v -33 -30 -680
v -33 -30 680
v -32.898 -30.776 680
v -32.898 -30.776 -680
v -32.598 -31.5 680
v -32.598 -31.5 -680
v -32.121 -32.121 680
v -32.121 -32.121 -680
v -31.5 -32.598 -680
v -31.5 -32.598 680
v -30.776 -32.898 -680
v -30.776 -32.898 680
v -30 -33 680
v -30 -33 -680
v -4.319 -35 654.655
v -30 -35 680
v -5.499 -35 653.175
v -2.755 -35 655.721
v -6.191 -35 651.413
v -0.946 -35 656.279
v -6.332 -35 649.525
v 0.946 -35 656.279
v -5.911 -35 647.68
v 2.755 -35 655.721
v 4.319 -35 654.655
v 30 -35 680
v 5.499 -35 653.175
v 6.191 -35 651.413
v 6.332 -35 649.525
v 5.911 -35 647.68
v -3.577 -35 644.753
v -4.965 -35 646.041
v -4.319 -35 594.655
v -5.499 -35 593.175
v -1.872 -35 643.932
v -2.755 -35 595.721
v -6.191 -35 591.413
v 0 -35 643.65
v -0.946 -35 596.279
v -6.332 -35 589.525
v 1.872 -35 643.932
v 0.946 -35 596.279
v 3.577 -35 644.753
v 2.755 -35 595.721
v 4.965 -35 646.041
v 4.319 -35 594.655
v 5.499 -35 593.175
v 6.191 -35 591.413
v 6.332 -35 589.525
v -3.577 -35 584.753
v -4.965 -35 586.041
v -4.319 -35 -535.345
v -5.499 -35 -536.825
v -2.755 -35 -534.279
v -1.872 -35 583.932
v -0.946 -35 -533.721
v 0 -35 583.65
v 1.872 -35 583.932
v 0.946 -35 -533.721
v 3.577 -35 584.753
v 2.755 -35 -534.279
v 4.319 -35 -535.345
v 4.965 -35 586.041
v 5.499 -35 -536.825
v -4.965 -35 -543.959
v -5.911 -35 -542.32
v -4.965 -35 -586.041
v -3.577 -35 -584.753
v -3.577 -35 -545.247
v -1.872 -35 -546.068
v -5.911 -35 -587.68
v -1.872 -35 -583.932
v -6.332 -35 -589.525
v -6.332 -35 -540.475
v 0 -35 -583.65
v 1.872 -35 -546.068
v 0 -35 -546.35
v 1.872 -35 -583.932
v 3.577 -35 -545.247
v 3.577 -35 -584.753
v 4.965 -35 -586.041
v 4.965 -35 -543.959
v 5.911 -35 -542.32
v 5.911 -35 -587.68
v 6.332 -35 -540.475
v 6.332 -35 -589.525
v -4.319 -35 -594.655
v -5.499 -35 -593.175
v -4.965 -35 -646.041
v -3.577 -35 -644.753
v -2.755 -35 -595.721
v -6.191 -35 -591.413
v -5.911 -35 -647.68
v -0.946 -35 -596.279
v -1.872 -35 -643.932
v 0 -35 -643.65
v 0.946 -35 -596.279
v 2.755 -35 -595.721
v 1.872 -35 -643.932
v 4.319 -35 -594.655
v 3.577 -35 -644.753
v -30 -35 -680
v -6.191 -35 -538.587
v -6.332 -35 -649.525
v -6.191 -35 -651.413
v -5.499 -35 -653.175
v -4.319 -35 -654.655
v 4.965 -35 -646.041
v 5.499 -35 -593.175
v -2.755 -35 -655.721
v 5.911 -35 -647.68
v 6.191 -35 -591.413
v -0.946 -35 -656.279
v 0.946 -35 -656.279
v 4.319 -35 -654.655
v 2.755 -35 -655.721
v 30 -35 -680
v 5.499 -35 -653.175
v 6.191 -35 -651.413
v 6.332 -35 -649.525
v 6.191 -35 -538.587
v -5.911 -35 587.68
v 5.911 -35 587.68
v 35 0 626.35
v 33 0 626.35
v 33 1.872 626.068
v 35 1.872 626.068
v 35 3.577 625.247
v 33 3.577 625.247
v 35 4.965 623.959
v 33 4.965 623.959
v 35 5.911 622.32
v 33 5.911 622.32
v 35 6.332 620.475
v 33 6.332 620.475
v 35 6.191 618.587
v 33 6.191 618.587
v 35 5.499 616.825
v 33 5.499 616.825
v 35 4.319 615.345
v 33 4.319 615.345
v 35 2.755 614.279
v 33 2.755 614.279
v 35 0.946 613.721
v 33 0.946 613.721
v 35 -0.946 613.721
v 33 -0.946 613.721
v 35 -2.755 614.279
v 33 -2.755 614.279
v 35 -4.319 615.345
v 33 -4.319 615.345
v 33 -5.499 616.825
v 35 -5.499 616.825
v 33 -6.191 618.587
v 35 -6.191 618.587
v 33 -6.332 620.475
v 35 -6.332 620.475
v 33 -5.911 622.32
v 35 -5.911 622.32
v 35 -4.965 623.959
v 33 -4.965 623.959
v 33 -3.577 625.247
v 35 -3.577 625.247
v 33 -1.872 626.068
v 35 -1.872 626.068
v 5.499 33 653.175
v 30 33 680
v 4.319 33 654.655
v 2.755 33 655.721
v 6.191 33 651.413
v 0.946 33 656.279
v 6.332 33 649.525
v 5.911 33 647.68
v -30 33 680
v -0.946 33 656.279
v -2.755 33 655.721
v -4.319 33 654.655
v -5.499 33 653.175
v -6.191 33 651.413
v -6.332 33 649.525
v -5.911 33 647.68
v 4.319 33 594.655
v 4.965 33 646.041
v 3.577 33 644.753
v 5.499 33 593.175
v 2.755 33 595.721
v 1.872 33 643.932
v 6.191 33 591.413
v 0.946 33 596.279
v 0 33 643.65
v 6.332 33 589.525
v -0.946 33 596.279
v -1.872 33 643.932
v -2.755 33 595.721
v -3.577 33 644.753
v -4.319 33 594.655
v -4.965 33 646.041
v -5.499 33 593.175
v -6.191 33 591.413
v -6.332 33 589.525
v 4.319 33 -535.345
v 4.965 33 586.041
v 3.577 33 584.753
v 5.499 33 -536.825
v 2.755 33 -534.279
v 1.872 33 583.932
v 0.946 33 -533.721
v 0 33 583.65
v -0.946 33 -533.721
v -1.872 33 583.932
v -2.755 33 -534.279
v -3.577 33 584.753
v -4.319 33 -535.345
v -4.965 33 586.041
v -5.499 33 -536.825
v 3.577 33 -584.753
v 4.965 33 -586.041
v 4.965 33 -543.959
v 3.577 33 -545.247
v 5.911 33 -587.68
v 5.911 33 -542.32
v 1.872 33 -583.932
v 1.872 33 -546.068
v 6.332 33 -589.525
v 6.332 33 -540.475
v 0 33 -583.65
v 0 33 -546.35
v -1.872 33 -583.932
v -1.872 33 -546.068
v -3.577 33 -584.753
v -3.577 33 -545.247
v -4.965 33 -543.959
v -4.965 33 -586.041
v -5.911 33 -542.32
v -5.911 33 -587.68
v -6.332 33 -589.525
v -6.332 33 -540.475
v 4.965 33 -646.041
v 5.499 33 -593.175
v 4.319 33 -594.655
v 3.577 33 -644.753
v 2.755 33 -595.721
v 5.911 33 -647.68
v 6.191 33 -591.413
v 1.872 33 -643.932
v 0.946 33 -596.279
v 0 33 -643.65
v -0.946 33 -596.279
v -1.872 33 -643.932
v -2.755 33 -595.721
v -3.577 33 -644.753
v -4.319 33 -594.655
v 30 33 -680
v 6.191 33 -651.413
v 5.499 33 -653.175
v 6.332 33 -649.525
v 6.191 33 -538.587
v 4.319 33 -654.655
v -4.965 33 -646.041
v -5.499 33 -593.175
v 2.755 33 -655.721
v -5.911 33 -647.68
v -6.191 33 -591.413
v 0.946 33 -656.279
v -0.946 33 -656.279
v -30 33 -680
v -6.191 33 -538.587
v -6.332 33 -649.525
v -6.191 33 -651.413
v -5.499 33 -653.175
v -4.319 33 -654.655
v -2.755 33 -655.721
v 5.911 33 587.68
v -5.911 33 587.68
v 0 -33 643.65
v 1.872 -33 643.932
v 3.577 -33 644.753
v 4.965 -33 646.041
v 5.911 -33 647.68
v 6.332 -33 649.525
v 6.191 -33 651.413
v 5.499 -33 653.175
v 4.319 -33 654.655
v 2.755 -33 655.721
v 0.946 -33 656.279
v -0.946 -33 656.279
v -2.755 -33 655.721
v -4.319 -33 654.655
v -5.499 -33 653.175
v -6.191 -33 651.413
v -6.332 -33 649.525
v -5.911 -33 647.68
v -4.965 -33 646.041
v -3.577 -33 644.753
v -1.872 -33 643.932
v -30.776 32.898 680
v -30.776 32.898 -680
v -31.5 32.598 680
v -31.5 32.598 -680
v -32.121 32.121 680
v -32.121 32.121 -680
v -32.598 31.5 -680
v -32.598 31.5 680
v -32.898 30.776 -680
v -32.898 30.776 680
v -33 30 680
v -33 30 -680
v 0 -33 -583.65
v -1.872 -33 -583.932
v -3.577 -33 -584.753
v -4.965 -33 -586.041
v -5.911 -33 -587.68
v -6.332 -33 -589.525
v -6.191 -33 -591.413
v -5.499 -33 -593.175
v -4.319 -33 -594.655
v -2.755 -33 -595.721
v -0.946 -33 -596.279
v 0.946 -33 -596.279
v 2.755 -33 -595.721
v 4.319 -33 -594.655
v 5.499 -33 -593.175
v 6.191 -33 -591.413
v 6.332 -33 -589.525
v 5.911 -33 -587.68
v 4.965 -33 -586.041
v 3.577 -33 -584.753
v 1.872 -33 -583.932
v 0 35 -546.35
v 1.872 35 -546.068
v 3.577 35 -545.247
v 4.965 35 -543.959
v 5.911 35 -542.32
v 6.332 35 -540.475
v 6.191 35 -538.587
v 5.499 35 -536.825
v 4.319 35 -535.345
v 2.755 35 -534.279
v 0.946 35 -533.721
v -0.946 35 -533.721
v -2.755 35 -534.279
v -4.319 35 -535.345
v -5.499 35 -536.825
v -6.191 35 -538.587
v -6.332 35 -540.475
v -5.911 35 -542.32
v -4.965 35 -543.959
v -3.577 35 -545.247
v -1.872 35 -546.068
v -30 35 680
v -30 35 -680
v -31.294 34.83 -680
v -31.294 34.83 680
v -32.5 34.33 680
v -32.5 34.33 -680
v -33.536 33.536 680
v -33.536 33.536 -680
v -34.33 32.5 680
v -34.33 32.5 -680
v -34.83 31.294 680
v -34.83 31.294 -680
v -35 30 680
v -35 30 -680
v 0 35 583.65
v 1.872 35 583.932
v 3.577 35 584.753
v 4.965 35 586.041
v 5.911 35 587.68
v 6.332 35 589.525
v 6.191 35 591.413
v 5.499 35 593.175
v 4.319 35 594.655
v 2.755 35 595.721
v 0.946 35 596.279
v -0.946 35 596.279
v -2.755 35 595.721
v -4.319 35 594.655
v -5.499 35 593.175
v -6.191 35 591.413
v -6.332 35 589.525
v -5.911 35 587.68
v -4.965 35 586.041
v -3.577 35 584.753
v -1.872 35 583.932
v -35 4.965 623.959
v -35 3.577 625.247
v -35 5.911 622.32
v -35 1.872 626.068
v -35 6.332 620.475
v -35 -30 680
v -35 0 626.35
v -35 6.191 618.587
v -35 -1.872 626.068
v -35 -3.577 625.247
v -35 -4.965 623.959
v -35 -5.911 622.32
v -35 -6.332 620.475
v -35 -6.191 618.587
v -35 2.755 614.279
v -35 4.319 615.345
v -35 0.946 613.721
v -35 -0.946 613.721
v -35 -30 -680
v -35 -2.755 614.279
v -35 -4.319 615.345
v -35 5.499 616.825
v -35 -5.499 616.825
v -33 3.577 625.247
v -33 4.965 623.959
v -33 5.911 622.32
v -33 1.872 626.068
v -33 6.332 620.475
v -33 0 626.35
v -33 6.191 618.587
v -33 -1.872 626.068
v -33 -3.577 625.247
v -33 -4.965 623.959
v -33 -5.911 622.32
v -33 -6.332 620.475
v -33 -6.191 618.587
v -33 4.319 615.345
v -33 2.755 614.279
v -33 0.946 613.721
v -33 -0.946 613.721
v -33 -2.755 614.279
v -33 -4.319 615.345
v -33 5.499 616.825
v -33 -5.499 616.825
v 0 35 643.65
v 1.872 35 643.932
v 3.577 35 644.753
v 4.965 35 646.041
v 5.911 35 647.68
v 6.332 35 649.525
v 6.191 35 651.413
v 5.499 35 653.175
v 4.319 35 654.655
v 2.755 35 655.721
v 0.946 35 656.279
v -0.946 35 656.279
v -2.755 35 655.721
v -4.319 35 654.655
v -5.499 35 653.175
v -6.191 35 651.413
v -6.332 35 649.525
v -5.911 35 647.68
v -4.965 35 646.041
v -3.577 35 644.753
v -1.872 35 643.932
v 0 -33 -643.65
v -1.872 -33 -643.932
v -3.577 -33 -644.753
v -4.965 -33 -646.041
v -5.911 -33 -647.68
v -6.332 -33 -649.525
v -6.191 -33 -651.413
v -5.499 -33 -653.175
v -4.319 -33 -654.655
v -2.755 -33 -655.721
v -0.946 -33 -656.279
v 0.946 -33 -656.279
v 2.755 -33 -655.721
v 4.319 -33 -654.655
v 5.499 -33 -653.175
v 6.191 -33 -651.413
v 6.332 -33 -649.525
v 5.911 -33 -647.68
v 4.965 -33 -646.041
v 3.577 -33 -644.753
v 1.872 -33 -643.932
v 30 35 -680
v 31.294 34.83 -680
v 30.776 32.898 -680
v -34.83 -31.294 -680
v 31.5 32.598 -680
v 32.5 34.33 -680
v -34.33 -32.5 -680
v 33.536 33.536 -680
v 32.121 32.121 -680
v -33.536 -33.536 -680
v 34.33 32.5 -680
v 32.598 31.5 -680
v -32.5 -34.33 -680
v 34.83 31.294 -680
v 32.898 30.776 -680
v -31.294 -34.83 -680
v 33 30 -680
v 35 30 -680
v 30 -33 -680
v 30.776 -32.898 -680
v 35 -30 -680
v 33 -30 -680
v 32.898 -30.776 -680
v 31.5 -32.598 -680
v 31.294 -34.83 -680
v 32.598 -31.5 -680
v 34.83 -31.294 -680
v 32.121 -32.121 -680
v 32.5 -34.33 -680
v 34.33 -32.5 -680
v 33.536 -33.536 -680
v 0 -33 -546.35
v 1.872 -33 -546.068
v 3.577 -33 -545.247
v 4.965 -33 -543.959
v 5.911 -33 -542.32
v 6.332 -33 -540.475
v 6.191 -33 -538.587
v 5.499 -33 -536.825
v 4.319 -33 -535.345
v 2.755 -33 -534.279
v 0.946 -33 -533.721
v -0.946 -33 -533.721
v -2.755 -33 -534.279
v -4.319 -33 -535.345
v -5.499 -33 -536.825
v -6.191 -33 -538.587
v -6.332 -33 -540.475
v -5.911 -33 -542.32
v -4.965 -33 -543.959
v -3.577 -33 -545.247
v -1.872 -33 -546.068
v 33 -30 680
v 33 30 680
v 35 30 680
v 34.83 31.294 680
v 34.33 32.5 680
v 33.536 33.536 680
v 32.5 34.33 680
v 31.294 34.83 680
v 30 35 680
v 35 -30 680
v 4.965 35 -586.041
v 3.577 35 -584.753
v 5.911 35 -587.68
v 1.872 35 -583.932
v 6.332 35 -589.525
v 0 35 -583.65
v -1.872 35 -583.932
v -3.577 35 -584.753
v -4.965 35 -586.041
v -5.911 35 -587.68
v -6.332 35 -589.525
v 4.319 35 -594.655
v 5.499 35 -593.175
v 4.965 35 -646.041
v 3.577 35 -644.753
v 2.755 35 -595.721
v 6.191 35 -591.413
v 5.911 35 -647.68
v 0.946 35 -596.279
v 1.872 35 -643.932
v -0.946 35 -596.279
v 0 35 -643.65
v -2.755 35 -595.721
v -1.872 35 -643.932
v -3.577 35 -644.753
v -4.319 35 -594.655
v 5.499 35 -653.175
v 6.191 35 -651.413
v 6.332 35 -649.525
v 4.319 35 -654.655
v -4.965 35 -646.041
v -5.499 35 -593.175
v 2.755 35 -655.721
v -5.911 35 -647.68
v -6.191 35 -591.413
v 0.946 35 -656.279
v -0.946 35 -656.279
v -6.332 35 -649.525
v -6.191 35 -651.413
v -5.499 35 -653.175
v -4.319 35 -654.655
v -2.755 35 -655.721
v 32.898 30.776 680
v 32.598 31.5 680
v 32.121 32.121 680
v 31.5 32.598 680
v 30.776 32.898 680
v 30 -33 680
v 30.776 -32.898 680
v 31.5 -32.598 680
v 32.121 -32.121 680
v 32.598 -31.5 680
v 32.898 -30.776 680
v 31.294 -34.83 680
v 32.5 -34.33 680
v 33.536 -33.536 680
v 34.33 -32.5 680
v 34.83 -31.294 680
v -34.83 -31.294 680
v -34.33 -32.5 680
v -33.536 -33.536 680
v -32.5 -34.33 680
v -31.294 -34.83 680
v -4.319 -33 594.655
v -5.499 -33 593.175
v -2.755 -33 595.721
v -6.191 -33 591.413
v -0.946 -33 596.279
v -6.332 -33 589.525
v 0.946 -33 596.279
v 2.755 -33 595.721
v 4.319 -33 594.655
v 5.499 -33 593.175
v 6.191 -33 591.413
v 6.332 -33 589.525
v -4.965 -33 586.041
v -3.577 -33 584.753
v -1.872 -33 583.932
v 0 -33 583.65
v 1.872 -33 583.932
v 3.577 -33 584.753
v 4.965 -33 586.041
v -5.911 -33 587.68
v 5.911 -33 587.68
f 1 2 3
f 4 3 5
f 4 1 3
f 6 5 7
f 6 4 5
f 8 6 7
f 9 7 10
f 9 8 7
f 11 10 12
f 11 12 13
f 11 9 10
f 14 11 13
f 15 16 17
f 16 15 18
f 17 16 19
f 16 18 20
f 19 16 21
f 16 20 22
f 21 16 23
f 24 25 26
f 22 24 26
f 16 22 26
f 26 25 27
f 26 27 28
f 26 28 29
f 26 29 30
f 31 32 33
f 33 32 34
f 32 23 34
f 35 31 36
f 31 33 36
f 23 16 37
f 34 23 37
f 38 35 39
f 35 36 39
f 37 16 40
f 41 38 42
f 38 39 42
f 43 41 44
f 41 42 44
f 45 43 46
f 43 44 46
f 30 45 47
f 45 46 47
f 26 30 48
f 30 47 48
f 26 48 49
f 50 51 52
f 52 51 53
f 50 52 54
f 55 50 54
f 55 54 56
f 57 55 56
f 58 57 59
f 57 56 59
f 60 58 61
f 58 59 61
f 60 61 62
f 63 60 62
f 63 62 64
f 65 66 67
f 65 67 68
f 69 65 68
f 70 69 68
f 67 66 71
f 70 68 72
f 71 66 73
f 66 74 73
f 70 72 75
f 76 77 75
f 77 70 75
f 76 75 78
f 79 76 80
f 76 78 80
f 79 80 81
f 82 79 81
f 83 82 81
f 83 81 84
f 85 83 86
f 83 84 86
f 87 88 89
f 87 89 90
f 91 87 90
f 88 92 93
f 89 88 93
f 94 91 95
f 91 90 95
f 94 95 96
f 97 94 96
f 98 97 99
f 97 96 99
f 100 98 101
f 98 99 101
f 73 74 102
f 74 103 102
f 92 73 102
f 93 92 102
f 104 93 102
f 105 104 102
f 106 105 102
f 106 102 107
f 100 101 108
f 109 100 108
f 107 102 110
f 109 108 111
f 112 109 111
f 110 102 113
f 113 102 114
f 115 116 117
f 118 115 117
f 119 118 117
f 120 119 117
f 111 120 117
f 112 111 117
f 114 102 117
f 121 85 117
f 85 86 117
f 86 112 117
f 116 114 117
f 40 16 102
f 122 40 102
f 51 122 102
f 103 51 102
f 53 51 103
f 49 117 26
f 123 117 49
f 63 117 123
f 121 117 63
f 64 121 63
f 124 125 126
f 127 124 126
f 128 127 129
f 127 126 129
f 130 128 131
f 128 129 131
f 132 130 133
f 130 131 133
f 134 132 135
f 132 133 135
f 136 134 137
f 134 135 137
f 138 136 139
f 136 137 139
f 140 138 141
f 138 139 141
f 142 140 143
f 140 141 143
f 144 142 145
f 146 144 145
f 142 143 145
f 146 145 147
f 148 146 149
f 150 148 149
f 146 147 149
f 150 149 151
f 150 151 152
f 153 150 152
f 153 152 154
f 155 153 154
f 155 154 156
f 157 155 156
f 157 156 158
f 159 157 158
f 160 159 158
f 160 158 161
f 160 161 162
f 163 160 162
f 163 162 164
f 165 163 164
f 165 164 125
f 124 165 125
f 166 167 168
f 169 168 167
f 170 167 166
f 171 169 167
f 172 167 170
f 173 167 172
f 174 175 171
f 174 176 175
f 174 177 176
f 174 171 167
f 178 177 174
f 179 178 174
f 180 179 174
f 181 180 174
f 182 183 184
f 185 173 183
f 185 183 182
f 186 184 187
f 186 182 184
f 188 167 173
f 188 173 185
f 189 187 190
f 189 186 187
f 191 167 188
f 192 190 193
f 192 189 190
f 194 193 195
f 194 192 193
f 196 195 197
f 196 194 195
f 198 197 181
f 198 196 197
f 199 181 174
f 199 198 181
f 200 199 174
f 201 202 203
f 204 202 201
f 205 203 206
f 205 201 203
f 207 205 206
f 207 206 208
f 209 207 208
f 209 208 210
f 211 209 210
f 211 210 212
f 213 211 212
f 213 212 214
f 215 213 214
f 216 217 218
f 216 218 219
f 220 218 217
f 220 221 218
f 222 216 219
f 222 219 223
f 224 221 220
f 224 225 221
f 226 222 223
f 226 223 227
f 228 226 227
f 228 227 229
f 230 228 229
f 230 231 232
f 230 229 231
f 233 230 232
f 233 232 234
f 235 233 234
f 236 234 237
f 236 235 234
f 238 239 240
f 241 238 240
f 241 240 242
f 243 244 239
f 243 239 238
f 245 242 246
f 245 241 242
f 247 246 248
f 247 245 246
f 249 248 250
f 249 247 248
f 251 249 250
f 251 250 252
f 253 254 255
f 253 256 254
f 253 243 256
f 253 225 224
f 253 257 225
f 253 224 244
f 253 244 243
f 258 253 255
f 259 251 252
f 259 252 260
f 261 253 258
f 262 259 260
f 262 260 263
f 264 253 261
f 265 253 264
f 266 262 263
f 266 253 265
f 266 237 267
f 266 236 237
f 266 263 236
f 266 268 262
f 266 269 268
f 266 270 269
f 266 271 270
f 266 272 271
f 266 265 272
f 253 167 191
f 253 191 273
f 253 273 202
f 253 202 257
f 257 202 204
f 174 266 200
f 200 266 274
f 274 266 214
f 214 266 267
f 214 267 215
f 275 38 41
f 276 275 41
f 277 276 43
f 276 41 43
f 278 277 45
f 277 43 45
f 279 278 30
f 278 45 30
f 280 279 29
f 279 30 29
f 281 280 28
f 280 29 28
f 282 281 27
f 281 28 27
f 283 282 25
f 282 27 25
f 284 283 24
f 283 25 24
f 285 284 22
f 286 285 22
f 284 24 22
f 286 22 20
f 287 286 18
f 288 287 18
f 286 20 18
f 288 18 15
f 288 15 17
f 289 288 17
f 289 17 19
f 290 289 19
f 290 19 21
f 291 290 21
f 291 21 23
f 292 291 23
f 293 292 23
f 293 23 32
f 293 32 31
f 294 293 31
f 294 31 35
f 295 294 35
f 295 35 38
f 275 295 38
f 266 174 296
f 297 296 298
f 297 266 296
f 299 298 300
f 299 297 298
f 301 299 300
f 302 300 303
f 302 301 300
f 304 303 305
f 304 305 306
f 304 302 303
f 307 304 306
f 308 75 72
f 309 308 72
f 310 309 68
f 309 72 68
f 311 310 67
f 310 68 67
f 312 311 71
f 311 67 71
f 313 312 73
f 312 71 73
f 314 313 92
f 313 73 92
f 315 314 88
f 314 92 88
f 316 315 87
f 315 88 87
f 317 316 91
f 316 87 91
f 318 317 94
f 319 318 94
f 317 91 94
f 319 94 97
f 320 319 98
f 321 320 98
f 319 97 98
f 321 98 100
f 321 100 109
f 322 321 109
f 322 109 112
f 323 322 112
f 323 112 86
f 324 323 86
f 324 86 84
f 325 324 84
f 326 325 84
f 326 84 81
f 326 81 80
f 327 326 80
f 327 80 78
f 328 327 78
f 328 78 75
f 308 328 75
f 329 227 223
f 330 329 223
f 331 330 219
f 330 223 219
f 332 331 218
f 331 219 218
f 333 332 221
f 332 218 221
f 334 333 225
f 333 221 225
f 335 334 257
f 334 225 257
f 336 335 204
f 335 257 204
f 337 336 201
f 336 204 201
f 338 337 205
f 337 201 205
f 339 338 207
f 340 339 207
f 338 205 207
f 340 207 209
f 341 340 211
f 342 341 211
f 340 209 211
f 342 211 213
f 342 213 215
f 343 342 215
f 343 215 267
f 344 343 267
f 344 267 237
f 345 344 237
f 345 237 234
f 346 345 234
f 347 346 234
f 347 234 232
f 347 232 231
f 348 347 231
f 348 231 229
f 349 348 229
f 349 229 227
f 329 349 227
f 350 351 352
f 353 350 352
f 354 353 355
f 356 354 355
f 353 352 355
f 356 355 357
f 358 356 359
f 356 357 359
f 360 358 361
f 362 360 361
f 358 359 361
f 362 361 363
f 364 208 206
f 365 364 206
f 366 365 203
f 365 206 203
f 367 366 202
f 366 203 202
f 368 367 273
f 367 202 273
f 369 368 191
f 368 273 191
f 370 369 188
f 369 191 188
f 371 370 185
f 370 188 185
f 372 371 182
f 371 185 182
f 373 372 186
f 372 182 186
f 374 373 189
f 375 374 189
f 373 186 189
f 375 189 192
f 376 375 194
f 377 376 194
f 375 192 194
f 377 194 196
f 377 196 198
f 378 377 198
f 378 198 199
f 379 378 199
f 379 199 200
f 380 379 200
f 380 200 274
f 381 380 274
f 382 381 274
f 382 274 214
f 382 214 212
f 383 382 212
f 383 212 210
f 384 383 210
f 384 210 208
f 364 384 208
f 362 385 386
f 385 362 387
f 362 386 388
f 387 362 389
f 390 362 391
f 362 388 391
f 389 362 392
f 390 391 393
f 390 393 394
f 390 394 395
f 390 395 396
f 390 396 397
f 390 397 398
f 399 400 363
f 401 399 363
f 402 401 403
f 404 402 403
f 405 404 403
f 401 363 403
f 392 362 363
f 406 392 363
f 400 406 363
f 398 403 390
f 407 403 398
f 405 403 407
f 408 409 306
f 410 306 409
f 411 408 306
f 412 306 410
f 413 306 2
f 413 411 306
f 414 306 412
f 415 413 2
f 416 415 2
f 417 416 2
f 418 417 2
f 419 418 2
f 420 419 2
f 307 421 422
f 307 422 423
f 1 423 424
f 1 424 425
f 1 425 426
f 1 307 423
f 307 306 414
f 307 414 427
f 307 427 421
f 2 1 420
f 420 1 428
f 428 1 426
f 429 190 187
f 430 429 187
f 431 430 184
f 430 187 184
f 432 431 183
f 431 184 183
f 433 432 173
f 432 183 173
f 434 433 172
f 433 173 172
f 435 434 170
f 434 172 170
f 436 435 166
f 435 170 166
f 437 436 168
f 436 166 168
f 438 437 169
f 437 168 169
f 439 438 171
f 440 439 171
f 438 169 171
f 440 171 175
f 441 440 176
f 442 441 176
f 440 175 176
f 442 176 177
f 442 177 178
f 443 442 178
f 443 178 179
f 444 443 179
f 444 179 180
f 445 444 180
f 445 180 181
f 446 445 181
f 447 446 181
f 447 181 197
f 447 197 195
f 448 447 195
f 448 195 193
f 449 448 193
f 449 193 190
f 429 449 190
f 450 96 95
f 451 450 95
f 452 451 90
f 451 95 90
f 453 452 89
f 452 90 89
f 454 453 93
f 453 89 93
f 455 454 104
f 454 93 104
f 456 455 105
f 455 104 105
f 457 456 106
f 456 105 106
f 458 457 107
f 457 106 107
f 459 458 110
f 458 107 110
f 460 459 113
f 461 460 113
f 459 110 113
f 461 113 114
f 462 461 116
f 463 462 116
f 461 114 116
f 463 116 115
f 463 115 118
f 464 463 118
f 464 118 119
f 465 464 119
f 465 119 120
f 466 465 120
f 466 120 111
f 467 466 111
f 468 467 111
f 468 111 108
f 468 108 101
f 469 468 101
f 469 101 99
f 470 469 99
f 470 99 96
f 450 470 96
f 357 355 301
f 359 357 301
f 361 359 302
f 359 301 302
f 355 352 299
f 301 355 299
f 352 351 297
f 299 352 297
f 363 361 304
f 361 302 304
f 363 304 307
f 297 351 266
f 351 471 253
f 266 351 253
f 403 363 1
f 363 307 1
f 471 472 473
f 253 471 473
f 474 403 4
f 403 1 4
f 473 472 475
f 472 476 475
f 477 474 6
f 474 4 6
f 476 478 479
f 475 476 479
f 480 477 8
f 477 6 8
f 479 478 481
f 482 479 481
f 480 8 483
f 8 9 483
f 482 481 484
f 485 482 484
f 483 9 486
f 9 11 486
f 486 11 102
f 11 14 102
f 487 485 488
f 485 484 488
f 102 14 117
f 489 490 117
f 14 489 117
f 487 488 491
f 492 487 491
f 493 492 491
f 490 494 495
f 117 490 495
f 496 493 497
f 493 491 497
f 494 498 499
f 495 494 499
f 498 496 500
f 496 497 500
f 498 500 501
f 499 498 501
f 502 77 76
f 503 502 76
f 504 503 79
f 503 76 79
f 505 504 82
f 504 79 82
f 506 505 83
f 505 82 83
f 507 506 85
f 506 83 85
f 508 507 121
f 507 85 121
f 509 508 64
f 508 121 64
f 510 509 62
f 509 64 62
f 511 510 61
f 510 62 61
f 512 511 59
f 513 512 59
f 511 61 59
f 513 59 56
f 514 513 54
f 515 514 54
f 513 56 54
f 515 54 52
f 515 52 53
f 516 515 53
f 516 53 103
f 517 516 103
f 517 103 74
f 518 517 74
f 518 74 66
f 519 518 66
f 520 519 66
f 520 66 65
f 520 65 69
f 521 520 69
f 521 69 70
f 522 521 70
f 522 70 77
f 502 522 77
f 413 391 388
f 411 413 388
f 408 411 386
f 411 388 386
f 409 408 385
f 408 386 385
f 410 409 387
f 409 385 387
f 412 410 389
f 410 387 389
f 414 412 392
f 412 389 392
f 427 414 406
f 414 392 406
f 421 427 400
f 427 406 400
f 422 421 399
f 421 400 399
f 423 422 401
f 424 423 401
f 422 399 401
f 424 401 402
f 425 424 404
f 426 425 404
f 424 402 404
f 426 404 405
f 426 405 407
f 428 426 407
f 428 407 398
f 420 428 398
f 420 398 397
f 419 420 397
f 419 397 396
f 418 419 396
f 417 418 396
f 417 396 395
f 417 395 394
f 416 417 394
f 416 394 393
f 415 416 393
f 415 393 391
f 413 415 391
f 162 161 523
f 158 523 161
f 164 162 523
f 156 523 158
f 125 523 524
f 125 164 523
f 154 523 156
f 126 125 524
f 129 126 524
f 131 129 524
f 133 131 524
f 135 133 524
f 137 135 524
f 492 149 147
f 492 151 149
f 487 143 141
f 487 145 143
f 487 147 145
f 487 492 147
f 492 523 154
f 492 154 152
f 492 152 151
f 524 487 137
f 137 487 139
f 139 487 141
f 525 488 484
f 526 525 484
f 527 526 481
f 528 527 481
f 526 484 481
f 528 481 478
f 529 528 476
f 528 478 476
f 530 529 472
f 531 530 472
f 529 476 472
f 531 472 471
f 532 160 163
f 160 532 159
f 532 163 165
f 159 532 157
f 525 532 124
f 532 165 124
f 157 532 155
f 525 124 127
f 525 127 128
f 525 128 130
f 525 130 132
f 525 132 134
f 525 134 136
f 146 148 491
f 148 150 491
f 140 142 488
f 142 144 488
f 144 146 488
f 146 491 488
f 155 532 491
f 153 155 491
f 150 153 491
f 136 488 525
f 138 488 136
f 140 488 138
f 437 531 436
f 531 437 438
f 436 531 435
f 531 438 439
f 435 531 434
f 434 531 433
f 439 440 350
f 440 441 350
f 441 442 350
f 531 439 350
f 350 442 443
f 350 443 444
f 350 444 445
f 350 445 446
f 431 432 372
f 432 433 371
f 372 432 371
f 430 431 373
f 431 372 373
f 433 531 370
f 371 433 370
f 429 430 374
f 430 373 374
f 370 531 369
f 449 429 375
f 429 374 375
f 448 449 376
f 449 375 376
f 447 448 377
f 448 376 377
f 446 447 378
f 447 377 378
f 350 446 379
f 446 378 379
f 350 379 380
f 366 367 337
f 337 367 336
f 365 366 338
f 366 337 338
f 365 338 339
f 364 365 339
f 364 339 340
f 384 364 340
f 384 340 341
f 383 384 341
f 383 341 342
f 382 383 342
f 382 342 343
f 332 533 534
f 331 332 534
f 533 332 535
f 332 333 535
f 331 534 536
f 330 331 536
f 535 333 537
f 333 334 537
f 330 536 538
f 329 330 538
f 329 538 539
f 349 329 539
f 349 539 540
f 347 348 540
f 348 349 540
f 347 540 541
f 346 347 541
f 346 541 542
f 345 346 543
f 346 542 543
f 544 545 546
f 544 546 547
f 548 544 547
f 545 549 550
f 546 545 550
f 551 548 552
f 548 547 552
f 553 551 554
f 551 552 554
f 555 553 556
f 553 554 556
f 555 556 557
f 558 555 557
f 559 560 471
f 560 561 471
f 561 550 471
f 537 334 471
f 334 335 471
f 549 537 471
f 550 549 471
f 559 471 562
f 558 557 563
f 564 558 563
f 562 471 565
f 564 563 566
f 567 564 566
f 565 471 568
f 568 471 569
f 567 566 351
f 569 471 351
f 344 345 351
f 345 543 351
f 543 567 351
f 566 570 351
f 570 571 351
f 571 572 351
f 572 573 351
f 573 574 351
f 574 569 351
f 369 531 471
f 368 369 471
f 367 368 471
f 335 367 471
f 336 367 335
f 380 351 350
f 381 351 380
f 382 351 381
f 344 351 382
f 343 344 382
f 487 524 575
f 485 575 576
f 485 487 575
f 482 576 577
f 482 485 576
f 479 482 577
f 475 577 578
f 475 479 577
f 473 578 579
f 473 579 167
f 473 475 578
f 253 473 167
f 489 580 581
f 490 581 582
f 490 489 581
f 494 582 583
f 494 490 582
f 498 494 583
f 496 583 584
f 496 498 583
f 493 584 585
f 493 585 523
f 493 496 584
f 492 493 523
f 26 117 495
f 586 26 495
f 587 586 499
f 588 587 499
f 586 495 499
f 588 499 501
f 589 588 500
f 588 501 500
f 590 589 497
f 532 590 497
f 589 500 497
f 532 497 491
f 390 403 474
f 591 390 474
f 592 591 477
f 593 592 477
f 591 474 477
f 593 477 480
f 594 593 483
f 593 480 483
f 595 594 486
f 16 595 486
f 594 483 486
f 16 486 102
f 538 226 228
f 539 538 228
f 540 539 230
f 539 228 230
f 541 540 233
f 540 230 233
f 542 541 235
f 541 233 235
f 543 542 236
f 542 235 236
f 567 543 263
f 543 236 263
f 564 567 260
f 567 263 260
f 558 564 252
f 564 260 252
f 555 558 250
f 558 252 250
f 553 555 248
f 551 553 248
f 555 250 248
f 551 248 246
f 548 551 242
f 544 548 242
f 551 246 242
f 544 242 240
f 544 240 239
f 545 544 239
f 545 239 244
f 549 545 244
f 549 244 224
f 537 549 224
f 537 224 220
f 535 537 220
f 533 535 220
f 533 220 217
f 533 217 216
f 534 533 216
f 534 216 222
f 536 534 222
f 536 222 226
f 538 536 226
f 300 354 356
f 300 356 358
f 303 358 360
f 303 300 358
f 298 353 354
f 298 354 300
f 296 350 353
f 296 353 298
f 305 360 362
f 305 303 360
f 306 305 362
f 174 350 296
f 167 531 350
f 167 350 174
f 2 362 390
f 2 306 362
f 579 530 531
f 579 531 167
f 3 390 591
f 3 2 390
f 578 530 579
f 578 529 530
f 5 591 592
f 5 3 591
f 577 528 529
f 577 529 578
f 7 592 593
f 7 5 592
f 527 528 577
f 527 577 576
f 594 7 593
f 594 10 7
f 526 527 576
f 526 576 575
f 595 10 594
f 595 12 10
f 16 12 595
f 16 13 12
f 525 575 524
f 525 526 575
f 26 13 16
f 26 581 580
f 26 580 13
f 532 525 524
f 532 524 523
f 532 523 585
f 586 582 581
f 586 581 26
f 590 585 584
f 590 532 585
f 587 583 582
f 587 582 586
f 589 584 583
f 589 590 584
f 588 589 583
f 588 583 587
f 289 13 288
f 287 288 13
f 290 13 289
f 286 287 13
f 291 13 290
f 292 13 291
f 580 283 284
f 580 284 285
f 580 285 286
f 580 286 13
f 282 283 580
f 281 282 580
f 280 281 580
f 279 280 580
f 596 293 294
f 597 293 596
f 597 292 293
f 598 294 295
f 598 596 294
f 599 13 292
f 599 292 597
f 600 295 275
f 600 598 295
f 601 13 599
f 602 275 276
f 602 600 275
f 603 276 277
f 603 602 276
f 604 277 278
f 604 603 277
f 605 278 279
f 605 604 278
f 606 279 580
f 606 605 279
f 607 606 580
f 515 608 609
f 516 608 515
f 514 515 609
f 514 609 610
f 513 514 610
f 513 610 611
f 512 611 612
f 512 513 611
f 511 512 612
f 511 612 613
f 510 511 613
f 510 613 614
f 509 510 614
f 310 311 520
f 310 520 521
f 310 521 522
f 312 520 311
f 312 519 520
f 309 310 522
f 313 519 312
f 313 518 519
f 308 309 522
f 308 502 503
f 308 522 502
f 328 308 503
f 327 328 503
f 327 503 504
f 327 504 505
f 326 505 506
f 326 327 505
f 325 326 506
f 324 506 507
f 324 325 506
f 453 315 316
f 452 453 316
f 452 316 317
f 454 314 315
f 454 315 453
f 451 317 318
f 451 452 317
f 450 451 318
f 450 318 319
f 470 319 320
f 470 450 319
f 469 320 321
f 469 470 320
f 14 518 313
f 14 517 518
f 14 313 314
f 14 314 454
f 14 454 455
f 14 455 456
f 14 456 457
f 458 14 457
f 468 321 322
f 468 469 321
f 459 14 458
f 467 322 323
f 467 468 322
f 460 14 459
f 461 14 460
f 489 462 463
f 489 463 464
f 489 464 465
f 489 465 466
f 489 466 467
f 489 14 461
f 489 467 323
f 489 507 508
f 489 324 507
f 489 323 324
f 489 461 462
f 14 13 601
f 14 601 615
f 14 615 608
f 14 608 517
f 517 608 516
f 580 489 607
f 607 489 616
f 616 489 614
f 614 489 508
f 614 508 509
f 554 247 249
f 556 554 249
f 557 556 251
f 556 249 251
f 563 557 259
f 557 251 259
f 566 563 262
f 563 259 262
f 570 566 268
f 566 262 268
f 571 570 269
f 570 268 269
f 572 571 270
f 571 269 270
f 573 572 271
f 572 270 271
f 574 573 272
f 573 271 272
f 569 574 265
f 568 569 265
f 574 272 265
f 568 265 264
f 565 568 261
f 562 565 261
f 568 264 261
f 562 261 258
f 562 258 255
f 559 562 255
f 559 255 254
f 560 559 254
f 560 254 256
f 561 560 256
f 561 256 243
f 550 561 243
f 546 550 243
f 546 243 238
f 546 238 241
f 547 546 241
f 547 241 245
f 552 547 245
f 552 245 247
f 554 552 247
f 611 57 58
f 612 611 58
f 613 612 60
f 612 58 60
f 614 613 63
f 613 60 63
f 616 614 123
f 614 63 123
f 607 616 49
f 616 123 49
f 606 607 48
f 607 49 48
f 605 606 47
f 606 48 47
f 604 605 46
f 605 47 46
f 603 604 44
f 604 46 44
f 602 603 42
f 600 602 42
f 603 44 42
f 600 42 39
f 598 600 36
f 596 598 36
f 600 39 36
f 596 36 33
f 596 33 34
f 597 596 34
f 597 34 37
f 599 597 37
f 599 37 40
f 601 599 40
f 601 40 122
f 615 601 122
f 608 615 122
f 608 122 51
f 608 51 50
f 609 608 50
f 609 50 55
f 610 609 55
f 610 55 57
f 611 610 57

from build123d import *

# Parameters (mm, degrees)
TUBO_CUADRADO_3_X_3_X_0_25_1_DEPTH = 1360
CROQUIS3_R                         = 6.35
CORTAR_EXTRUIR1_DEPTH              = 685.488860391
CROQUIS4_R                         = 6.35
CORTAR_EXTRUIR2_DEPTH              = 685.488860391


with BuildPart() as part:
    # Sketch1 → Tubo cuadrado 3 X 3 X 0.25(1) (new body)
    with BuildSketch(Plane(origin=(0, 0, -680), x_dir=(0, -1, 0), z_dir=(0, 0, 1))):
        with BuildLine():
            Line((-30, -35), (30, -35))
            ThreePointArc((30, -35), (33.535533906, -33.535533906), (35, -30))
            Line((35, -30), (35, 30))
            ThreePointArc((35, 30), (33.535533906, 33.535533906), (30, 35))
            Line((30, 35), (-30, 35))
            ThreePointArc((-30, 35), (-33.535533906, 33.535533906), (-35, 30))
            Line((-35, 30), (-35, -30))
            ThreePointArc((-35, -30), (-33.535533906, -33.535533906), (-30, -35))
        make_face()
        with BuildLine():
            Line((-30, -33), (30, -33))
            ThreePointArc((30, -33), (32.121320344, -32.121320344), (33, -30))
            Line((33, -30), (33, 30))
            ThreePointArc((33, 30), (32.121320344, 32.121320344), (30, 33))
            Line((30, 33), (-30, 33))
            ThreePointArc((-30, 33), (-32.121320344, 32.121320344), (-33, 30))
            Line((-33, 30), (-33, -30))
            ThreePointArc((-33, -30), (-32.121320344, -32.121320344), (-30, -33))
        make_face(mode=Mode.SUBTRACT)
    extrude(amount=TUBO_CUADRADO_3_X_3_X_0_25_1_DEPTH)

    # Croquis3 → Cortar-Extruir1 (cut, through all)
    with BuildSketch(Plane.XZ.offset(35)):
        with Locations(Location((0, 650, 0), (0, 0, 270))):
            Circle(CROQUIS3_R)
        with Locations(Location((0, 590, 0), (0, 0, 270))):
            Circle(CROQUIS3_R)
        with Locations(Location((0, -590, 0), (0, 0, 90))):
            Circle(CROQUIS3_R)
        with Locations(Location((0, -650, 0), (0, 0, 90))):
            Circle(CROQUIS3_R)
        with Locations(Location((0, -540, 0), (0, 0, 270))):
            Circle(CROQUIS3_R)
    extrude(amount=-CORTAR_EXTRUIR1_DEPTH, mode=Mode.SUBTRACT)

    # Croquis4 → Cortar-Extruir2 (cut, through all)
    with BuildSketch(Plane.ZY.offset(35)):
        with Locations((620, 0)):
            Circle(CROQUIS4_R)
    extrude(amount=-CORTAR_EXTRUIR2_DEPTH, mode=Mode.SUBTRACT)


solid = part.part
